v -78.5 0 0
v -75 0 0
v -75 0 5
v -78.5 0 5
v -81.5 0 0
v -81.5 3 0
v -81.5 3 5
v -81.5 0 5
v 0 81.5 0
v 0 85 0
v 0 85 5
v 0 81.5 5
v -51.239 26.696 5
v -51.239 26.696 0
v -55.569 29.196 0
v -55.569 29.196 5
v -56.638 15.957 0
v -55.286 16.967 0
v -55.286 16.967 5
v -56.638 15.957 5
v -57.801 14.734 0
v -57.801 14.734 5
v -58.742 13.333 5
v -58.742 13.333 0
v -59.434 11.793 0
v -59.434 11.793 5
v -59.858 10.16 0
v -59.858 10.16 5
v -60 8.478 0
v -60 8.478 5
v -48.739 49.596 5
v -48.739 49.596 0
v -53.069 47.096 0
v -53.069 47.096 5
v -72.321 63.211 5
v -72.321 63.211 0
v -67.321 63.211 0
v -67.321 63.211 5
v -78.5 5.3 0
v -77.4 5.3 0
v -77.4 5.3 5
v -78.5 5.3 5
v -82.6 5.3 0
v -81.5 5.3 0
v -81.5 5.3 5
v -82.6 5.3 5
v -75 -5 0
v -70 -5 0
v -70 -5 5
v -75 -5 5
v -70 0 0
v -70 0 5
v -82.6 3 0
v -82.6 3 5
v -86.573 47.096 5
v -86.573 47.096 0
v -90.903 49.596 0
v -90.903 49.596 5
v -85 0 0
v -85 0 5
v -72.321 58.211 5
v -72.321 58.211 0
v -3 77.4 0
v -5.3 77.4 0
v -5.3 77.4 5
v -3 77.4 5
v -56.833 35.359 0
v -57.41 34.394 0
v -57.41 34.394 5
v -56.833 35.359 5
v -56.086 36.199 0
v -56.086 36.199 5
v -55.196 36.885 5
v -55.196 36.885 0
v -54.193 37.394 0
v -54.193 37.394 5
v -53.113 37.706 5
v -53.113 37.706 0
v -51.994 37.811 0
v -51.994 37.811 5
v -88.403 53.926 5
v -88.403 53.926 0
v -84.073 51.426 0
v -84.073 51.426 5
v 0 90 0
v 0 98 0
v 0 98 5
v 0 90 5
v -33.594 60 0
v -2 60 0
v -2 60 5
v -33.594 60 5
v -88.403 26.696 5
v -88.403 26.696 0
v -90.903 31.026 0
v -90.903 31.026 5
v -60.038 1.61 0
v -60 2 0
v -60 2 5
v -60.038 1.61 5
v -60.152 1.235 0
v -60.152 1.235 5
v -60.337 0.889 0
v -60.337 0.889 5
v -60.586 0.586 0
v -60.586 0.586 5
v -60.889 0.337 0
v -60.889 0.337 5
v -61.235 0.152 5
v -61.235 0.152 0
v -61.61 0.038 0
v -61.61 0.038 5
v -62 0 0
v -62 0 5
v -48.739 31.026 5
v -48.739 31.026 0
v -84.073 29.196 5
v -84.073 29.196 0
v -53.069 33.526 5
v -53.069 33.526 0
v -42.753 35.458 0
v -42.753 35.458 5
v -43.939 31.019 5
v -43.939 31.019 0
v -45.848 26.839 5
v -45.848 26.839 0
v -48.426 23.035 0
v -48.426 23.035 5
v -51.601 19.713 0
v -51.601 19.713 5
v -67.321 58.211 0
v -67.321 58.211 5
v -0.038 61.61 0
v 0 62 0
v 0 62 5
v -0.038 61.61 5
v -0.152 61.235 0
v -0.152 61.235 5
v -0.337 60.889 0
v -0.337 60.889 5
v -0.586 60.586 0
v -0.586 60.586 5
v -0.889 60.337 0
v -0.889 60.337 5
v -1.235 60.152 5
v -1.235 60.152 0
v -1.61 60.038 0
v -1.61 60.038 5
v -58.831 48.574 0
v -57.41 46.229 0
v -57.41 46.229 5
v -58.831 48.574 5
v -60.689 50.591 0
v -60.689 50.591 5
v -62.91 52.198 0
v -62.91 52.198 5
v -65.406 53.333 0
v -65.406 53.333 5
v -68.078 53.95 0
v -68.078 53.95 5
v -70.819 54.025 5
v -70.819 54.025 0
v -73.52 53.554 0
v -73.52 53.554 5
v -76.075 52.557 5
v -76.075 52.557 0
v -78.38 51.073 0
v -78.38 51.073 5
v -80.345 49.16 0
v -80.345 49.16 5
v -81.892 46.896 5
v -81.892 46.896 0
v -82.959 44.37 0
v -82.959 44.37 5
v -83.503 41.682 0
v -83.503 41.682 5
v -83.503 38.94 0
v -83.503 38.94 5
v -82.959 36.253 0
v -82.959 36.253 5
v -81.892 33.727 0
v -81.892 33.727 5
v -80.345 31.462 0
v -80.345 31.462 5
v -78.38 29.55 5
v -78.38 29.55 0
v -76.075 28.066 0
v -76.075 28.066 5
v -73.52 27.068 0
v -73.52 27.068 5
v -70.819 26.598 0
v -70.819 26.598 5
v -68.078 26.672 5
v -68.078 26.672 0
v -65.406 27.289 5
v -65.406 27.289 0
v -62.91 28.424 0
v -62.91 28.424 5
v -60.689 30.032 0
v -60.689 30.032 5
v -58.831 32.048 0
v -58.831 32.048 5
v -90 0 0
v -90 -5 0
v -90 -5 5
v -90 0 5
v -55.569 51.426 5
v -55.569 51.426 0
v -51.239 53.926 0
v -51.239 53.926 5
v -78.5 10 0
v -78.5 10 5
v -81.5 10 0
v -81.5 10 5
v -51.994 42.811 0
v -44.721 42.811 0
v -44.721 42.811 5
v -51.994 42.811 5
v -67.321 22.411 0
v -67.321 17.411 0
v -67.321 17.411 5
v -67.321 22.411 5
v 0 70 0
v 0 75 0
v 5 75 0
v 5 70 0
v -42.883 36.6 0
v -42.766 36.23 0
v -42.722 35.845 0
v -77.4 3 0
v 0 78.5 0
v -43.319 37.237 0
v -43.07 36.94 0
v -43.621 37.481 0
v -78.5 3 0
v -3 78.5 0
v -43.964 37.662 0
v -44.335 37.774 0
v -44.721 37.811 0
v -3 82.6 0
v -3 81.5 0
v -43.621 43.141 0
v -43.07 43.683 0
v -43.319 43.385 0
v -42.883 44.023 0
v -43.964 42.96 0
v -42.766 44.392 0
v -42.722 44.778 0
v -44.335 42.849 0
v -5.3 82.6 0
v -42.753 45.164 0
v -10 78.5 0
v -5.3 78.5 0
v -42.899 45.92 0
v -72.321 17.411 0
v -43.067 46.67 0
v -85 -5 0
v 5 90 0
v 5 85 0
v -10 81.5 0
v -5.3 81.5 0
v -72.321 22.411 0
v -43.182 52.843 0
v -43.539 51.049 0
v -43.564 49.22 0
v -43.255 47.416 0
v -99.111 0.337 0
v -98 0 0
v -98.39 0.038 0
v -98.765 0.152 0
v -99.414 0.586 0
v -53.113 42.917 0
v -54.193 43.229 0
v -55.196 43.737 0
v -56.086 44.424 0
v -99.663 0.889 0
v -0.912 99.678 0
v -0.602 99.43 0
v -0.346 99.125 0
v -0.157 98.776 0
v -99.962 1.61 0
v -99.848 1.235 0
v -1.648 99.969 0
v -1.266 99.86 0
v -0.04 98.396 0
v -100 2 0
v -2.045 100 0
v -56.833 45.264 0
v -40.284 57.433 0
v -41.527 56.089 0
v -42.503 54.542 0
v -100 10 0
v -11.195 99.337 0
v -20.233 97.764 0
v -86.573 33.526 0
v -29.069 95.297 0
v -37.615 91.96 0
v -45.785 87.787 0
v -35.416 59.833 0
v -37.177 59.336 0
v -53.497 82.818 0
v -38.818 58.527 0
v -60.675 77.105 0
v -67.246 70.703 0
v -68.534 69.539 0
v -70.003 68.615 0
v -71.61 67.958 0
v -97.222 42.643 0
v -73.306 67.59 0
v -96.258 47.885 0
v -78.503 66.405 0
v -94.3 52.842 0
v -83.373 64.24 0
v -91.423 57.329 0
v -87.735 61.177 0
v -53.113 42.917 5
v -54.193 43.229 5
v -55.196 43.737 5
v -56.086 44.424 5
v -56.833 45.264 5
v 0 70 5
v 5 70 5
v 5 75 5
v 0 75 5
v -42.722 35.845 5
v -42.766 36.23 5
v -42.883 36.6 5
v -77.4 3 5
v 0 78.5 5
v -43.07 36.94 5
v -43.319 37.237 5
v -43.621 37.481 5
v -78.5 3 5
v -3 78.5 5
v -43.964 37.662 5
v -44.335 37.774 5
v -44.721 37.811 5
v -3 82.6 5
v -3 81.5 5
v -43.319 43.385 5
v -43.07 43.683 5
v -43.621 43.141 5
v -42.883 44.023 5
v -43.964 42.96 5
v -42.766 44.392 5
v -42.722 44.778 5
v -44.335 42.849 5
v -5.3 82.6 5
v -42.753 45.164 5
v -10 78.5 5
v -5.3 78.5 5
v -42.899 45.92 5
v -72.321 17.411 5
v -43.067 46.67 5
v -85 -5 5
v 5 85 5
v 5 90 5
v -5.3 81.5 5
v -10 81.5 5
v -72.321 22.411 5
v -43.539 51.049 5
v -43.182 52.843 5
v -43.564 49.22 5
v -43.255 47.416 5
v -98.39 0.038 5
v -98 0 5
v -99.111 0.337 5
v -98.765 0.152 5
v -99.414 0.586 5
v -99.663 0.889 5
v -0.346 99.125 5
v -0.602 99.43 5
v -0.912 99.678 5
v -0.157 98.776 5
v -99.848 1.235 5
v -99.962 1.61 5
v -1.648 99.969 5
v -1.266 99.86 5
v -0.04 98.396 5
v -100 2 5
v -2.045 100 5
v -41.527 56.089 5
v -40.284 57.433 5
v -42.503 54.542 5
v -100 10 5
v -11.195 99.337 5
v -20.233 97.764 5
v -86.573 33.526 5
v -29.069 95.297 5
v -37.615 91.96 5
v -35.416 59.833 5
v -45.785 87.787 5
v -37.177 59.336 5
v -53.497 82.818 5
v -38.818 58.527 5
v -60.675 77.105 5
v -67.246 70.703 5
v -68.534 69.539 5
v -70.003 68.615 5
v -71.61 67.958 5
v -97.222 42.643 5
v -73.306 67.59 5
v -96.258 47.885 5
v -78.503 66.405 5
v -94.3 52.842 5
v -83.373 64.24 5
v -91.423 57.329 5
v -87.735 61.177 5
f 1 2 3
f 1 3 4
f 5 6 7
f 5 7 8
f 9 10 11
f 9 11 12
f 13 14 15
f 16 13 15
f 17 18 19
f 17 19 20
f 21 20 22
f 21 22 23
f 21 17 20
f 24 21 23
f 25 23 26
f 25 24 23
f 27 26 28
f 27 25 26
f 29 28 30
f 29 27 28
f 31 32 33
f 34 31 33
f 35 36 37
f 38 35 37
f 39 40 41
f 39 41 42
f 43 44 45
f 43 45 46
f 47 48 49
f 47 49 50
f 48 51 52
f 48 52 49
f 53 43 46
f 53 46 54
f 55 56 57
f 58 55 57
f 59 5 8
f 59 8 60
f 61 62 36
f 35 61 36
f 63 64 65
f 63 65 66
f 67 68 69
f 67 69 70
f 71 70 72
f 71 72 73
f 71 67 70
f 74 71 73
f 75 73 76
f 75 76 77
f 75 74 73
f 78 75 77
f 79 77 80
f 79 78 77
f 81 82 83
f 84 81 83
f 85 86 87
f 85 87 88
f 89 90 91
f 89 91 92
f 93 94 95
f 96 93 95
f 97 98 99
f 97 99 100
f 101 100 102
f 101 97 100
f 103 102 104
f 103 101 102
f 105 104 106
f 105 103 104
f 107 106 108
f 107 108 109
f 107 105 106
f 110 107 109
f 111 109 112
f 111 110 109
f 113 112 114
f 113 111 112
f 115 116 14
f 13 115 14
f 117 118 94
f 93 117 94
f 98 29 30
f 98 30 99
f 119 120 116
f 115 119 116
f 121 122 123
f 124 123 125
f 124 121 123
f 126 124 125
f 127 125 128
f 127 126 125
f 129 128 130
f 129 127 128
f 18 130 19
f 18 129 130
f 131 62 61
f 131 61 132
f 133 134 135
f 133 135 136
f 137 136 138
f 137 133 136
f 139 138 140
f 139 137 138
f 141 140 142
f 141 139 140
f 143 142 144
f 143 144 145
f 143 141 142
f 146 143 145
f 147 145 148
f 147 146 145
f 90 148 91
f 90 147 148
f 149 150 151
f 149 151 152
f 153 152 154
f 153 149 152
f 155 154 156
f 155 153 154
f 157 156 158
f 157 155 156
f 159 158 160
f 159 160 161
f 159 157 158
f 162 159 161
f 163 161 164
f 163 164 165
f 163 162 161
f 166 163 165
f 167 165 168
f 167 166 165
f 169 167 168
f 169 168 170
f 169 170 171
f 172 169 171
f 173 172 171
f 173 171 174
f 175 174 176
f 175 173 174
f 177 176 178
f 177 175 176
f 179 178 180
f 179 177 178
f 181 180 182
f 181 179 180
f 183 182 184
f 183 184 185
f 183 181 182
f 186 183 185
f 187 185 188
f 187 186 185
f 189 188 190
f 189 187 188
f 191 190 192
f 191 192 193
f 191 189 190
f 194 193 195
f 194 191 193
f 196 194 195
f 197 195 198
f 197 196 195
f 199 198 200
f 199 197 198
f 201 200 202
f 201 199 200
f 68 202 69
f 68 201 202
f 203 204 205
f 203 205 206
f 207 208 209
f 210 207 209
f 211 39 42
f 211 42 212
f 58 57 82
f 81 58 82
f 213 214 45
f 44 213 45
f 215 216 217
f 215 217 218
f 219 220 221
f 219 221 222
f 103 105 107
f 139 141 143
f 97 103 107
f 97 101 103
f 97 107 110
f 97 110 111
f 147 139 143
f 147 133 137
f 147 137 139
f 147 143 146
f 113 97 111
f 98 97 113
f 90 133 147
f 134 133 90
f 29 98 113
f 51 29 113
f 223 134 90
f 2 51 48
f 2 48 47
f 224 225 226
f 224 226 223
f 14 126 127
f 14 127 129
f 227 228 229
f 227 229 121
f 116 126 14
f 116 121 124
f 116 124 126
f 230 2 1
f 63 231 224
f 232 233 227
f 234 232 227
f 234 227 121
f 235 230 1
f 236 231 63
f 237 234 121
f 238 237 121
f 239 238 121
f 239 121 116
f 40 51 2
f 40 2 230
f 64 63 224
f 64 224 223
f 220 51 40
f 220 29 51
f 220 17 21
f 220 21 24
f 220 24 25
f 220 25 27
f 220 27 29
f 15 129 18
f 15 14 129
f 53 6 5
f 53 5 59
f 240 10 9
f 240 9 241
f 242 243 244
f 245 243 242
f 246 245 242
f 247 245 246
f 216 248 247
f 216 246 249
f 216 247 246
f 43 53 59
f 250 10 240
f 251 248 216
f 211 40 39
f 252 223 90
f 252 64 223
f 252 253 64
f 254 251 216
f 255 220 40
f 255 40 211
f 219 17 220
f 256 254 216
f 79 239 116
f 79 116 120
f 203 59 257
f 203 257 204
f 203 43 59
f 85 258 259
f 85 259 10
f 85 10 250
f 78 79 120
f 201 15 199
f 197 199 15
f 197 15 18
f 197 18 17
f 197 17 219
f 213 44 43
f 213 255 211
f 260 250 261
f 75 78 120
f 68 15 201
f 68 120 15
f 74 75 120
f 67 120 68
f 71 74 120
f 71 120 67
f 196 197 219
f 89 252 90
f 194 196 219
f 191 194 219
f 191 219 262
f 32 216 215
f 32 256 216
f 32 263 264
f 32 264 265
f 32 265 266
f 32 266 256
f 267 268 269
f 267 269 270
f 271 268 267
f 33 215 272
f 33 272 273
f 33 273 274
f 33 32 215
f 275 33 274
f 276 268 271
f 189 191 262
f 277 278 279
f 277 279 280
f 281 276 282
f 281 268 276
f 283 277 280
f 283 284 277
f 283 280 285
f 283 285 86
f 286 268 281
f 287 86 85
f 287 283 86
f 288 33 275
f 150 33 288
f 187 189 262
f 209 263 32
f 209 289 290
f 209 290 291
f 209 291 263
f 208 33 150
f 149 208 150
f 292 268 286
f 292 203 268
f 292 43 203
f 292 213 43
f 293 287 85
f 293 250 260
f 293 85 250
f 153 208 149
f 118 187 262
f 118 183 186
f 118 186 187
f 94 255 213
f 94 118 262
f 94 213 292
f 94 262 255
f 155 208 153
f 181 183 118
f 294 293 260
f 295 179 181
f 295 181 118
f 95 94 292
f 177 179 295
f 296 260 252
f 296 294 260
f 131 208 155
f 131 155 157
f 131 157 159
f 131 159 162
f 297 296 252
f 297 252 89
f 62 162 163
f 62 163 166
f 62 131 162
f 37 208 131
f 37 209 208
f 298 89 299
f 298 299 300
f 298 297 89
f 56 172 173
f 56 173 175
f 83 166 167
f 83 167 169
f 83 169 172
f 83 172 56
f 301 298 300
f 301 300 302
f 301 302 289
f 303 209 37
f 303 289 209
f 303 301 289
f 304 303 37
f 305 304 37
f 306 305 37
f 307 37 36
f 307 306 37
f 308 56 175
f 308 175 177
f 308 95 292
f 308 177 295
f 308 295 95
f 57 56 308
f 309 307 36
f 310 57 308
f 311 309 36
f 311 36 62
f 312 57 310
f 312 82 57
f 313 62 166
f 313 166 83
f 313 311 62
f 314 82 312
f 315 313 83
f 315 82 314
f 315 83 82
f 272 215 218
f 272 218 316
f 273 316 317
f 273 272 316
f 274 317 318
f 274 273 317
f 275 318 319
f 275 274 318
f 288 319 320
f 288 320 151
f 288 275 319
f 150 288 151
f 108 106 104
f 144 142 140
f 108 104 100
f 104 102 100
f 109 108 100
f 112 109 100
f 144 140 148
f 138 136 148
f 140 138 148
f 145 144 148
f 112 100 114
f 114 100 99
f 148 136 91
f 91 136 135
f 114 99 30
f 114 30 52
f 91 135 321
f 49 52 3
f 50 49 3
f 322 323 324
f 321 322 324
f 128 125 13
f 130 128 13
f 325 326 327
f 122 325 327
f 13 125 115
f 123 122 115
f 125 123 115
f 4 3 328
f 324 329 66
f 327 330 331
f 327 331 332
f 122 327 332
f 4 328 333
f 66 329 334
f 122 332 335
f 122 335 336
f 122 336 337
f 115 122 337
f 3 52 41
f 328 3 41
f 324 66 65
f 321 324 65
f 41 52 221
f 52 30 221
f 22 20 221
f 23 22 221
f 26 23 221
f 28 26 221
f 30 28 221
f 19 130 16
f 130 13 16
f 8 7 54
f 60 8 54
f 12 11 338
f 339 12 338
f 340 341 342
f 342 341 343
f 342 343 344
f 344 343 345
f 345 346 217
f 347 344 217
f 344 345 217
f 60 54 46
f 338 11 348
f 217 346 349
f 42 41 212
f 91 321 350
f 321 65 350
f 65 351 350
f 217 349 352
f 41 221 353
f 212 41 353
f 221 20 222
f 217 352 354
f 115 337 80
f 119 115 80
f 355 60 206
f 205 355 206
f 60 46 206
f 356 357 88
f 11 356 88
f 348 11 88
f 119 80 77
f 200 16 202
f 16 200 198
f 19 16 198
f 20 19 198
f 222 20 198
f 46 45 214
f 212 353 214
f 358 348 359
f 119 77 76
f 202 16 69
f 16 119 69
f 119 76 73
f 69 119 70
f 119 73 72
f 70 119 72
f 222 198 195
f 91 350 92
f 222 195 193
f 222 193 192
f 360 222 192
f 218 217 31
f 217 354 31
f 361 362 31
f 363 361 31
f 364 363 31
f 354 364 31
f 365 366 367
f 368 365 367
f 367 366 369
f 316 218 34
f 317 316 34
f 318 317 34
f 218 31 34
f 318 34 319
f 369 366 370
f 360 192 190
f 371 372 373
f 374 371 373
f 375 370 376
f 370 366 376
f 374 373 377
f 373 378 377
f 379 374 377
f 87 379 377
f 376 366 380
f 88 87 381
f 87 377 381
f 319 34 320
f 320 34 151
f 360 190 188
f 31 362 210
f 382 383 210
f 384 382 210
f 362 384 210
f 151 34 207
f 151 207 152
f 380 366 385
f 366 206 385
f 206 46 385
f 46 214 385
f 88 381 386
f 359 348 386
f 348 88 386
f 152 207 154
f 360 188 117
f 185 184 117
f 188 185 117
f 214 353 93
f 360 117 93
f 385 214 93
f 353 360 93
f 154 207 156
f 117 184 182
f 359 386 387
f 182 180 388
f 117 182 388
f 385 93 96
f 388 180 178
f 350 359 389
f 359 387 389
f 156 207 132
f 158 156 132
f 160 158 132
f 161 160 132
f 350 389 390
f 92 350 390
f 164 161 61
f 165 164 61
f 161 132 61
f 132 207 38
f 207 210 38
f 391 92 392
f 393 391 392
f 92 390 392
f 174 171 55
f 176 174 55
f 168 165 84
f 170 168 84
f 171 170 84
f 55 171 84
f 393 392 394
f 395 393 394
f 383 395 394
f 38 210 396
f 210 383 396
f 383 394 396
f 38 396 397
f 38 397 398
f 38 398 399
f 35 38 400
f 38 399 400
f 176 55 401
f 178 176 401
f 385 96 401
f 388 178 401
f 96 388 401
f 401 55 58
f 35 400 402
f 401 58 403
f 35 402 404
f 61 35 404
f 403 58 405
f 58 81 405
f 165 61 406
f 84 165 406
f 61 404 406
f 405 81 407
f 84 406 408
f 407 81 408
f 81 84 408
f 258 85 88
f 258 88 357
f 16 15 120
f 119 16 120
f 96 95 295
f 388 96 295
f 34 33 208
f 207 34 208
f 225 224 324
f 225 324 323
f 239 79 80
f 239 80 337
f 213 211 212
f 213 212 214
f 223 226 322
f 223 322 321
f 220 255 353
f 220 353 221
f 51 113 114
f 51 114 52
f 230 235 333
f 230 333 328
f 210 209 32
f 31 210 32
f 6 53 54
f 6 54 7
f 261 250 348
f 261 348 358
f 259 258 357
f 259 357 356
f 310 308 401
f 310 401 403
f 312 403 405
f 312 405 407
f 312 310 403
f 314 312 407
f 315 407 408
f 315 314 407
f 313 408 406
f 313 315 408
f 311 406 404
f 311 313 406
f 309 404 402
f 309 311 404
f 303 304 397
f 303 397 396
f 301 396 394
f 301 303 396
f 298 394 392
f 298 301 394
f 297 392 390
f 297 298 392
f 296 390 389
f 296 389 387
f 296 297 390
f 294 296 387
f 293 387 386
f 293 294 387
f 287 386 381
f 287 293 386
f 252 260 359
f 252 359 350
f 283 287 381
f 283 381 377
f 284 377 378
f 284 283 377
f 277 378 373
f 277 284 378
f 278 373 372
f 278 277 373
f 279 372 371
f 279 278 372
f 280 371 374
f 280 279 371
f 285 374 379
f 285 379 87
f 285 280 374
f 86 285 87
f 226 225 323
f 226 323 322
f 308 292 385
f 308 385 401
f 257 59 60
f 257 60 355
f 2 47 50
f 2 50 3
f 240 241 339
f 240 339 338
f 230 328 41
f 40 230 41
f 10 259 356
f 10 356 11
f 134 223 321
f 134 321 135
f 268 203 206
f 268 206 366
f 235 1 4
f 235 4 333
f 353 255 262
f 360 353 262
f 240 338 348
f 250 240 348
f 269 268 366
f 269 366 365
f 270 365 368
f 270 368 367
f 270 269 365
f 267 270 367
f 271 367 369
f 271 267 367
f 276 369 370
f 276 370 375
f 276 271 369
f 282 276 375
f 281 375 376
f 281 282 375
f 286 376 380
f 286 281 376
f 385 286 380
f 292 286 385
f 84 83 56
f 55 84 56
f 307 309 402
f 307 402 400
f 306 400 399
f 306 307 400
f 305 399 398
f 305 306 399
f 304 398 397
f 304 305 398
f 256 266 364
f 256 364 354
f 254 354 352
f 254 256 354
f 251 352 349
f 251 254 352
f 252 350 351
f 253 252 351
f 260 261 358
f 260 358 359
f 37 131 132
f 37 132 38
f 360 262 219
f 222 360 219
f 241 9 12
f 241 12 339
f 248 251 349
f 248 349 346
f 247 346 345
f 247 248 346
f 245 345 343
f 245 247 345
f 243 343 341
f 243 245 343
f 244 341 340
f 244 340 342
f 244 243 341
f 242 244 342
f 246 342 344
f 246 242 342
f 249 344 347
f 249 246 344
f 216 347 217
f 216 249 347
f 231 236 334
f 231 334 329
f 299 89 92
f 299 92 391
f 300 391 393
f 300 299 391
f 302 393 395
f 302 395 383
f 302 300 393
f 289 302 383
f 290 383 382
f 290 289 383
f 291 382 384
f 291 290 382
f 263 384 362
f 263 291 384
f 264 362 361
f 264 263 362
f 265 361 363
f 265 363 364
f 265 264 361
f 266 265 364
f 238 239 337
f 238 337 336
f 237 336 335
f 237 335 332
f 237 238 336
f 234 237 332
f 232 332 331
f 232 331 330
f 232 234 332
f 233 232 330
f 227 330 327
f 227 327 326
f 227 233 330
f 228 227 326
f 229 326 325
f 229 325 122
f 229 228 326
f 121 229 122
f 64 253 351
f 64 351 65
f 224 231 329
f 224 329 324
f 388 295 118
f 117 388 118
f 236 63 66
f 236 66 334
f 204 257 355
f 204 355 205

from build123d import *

# Parameters (mm, degrees)
ESQUISSE1_W        = 5
ESQUISSE1_H        = 5
BOSS_EXTRU_1_DEPTH = 5


with BuildPart() as part:
    # Esquisse1 → Boss.-Extru.1 (new body)
    with BuildSketch(Plane.XY):
        with BuildLine():
            Line((-62, 0), (-70, 0))
            Line((-70, 0), (-70, -5))
            Line((-70, -5), (-75, -5))
            Line((-75, -5), (-75, 0))
            Line((-75, 0), (-78.5, 0))
            Line((-78.5, 0), (-78.5, 3))
            Line((-78.5, 3), (-77.4, 3))
            Line((-77.4, 3), (-77.4, 5.3))
            Line((-77.4, 5.3), (-78.5, 5.3))
            Line((-78.5, 5.3), (-78.5, 10))
            Line((-78.5, 10), (-81.5, 10))
            Line((-81.5, 10), (-81.5, 5.3))
            Line((-81.5, 5.3), (-82.6, 5.3))
            Line((-82.6, 5.3), (-82.6, 3))
            Line((-82.6, 3), (-81.5, 3))
            Line((-81.5, 3), (-81.5, 0))
            Line((-81.5, 0), (-85, 0))
            Line((-85, 0), (-85, -5))
            Line((-85, -5), (-90, -5))
            Line((-90, -5), (-90, 0))
            Line((-90, 0), (-98, 0))
            ThreePointArc((-98, 0), (-99.414213562, 0.585786438), (-100, 2))
            Line((-100, 2), (-100, 10))
            Line((-100, 10), (-97.222166499, 42.643036354))
            ThreePointArc((-97.222166499, 42.643036354), (-89.672333618, 59.342381794), (-73.306153302, 67.589578681))
            ThreePointArc((-73.306153302, 67.589578681), (-70.002900284, 68.614551275), (-67.24637377, 70.70347705))
            ThreePointArc((-67.24637377, 70.70347705), (-37.614790527, 91.960082654), (-2.044554135, 99.999503671))
            ThreePointArc((-2.044554135, 99.999503671), (-0.601627423, 99.429879063), (0, 98))
            Line((0, 98), (0, 90))
            Line((0, 90), (5, 90))
            Line((5, 90), (5, 85))
            Line((5, 85), (0, 85))
            Line((0, 85), (0, 81.5))
            Line((0, 81.5), (-3, 81.5))
            Line((-3, 81.5), (-3, 82.6))
            Line((-3, 82.6), (-5.3, 82.6))
            Line((-5.3, 82.6), (-5.3, 81.5))
            Line((-5.3, 81.5), (-10, 81.5))
            Line((-10, 81.5), (-10, 78.5))
            Line((-10, 78.5), (-5.3, 78.5))
            Line((-5.3, 78.5), (-5.3, 77.4))
            Line((-5.3, 77.4), (-3, 77.4))
            Line((-3, 77.4), (-3, 78.5))
            Line((-3, 78.5), (0, 78.5))
            Line((0, 78.5), (0, 75))
            Line((0, 75), (5, 75))
            Line((5, 75), (5, 70))
            Line((5, 70), (0, 70))
            Line((0, 70), (0, 62))
            ThreePointArc((0, 62), (-0.585786438, 60.585786438), (-2, 60))
            Line((-2, 60), (-33.594430088, 60))
            ThreePointArc((-33.594430088, 60), (-41.52653458, 56.08947603), (-43.254902123, 47.416343664))
            ThreePointArc((-43.254902123, 47.416343664), (-42.980213788, 46.295555399), (-42.752787596, 45.164229918))
            ThreePointArc((-42.752787596, 45.164229918), (-43.187469445, 43.527910846), (-44.721399423, 42.811288741))
            Line((-44.721399423, 42.811288741), (-51.993903733, 42.811288741))
            ThreePointArc((-51.993903733, 42.811288741), (-55.195960034, 43.737154782), (-57.409791273, 46.22901026))
            ThreePointArc((-57.409791273, 46.22901026), (-83.571200219, 40.311288741), (-57.409791273, 34.393567223))
            ThreePointArc((-57.409791273, 34.393567223), (-55.195960034, 36.885422701), (-51.993903733, 37.811288741))
            Line((-51.993903733, 37.811288741), (-44.721399423, 37.811288741))
            ThreePointArc((-44.721399423, 37.811288741), (-43.187469445, 37.094666637), (-42.752787596, 35.458347565))
            ThreePointArc((-42.752787596, 35.458347565), (-47.057034679, 24.882654088), (-55.285653392, 16.96674166))
            ThreePointArc((-55.285653392, 16.96674166), (-58.742326175, 13.332888367), (-60, 8.477815449))
            Line((-60, 8.477815449), (-60, 2))
            ThreePointArc((-60, 2), (-60.585786438, 0.585786438), (-62, 0))
        make_face()
        with Locations((-69.821200219, 60.711288741)):
            Rectangle(ESQUISSE1_W, ESQUISSE1_H, mode=Mode.SUBTRACT)
        Polygon((-51.239218472, 53.926352251), (-48.739218472, 49.596225232), (-53.069345491, 47.096225232), (-55.569345491, 51.426352251), align=None, mode=Mode.SUBTRACT)
        Polygon((-48.739218472, 31.026352251), (-51.239218472, 26.696225232), (-55.569345491, 29.196225232), (-53.069345491, 33.526352251), align=None, mode=Mode.SUBTRACT)
        with Locations((-69.821200219, 19.911288741)):
            Rectangle(ESQUISSE1_W, ESQUISSE1_H, mode=Mode.SUBTRACT)
        Polygon((-88.403181966, 26.696225232), (-90.903181966, 31.026352251), (-86.573054947, 33.526352251), (-84.073054947, 29.196225232), align=None, mode=Mode.SUBTRACT)
        Polygon((-90.903181966, 49.596225232), (-88.403181966, 53.926352251), (-84.073054947, 51.426352251), (-86.573054947, 47.096225232), align=None, mode=Mode.SUBTRACT)
    extrude(amount=BOSS_EXTRU_1_DEPTH)


solid = part.part
